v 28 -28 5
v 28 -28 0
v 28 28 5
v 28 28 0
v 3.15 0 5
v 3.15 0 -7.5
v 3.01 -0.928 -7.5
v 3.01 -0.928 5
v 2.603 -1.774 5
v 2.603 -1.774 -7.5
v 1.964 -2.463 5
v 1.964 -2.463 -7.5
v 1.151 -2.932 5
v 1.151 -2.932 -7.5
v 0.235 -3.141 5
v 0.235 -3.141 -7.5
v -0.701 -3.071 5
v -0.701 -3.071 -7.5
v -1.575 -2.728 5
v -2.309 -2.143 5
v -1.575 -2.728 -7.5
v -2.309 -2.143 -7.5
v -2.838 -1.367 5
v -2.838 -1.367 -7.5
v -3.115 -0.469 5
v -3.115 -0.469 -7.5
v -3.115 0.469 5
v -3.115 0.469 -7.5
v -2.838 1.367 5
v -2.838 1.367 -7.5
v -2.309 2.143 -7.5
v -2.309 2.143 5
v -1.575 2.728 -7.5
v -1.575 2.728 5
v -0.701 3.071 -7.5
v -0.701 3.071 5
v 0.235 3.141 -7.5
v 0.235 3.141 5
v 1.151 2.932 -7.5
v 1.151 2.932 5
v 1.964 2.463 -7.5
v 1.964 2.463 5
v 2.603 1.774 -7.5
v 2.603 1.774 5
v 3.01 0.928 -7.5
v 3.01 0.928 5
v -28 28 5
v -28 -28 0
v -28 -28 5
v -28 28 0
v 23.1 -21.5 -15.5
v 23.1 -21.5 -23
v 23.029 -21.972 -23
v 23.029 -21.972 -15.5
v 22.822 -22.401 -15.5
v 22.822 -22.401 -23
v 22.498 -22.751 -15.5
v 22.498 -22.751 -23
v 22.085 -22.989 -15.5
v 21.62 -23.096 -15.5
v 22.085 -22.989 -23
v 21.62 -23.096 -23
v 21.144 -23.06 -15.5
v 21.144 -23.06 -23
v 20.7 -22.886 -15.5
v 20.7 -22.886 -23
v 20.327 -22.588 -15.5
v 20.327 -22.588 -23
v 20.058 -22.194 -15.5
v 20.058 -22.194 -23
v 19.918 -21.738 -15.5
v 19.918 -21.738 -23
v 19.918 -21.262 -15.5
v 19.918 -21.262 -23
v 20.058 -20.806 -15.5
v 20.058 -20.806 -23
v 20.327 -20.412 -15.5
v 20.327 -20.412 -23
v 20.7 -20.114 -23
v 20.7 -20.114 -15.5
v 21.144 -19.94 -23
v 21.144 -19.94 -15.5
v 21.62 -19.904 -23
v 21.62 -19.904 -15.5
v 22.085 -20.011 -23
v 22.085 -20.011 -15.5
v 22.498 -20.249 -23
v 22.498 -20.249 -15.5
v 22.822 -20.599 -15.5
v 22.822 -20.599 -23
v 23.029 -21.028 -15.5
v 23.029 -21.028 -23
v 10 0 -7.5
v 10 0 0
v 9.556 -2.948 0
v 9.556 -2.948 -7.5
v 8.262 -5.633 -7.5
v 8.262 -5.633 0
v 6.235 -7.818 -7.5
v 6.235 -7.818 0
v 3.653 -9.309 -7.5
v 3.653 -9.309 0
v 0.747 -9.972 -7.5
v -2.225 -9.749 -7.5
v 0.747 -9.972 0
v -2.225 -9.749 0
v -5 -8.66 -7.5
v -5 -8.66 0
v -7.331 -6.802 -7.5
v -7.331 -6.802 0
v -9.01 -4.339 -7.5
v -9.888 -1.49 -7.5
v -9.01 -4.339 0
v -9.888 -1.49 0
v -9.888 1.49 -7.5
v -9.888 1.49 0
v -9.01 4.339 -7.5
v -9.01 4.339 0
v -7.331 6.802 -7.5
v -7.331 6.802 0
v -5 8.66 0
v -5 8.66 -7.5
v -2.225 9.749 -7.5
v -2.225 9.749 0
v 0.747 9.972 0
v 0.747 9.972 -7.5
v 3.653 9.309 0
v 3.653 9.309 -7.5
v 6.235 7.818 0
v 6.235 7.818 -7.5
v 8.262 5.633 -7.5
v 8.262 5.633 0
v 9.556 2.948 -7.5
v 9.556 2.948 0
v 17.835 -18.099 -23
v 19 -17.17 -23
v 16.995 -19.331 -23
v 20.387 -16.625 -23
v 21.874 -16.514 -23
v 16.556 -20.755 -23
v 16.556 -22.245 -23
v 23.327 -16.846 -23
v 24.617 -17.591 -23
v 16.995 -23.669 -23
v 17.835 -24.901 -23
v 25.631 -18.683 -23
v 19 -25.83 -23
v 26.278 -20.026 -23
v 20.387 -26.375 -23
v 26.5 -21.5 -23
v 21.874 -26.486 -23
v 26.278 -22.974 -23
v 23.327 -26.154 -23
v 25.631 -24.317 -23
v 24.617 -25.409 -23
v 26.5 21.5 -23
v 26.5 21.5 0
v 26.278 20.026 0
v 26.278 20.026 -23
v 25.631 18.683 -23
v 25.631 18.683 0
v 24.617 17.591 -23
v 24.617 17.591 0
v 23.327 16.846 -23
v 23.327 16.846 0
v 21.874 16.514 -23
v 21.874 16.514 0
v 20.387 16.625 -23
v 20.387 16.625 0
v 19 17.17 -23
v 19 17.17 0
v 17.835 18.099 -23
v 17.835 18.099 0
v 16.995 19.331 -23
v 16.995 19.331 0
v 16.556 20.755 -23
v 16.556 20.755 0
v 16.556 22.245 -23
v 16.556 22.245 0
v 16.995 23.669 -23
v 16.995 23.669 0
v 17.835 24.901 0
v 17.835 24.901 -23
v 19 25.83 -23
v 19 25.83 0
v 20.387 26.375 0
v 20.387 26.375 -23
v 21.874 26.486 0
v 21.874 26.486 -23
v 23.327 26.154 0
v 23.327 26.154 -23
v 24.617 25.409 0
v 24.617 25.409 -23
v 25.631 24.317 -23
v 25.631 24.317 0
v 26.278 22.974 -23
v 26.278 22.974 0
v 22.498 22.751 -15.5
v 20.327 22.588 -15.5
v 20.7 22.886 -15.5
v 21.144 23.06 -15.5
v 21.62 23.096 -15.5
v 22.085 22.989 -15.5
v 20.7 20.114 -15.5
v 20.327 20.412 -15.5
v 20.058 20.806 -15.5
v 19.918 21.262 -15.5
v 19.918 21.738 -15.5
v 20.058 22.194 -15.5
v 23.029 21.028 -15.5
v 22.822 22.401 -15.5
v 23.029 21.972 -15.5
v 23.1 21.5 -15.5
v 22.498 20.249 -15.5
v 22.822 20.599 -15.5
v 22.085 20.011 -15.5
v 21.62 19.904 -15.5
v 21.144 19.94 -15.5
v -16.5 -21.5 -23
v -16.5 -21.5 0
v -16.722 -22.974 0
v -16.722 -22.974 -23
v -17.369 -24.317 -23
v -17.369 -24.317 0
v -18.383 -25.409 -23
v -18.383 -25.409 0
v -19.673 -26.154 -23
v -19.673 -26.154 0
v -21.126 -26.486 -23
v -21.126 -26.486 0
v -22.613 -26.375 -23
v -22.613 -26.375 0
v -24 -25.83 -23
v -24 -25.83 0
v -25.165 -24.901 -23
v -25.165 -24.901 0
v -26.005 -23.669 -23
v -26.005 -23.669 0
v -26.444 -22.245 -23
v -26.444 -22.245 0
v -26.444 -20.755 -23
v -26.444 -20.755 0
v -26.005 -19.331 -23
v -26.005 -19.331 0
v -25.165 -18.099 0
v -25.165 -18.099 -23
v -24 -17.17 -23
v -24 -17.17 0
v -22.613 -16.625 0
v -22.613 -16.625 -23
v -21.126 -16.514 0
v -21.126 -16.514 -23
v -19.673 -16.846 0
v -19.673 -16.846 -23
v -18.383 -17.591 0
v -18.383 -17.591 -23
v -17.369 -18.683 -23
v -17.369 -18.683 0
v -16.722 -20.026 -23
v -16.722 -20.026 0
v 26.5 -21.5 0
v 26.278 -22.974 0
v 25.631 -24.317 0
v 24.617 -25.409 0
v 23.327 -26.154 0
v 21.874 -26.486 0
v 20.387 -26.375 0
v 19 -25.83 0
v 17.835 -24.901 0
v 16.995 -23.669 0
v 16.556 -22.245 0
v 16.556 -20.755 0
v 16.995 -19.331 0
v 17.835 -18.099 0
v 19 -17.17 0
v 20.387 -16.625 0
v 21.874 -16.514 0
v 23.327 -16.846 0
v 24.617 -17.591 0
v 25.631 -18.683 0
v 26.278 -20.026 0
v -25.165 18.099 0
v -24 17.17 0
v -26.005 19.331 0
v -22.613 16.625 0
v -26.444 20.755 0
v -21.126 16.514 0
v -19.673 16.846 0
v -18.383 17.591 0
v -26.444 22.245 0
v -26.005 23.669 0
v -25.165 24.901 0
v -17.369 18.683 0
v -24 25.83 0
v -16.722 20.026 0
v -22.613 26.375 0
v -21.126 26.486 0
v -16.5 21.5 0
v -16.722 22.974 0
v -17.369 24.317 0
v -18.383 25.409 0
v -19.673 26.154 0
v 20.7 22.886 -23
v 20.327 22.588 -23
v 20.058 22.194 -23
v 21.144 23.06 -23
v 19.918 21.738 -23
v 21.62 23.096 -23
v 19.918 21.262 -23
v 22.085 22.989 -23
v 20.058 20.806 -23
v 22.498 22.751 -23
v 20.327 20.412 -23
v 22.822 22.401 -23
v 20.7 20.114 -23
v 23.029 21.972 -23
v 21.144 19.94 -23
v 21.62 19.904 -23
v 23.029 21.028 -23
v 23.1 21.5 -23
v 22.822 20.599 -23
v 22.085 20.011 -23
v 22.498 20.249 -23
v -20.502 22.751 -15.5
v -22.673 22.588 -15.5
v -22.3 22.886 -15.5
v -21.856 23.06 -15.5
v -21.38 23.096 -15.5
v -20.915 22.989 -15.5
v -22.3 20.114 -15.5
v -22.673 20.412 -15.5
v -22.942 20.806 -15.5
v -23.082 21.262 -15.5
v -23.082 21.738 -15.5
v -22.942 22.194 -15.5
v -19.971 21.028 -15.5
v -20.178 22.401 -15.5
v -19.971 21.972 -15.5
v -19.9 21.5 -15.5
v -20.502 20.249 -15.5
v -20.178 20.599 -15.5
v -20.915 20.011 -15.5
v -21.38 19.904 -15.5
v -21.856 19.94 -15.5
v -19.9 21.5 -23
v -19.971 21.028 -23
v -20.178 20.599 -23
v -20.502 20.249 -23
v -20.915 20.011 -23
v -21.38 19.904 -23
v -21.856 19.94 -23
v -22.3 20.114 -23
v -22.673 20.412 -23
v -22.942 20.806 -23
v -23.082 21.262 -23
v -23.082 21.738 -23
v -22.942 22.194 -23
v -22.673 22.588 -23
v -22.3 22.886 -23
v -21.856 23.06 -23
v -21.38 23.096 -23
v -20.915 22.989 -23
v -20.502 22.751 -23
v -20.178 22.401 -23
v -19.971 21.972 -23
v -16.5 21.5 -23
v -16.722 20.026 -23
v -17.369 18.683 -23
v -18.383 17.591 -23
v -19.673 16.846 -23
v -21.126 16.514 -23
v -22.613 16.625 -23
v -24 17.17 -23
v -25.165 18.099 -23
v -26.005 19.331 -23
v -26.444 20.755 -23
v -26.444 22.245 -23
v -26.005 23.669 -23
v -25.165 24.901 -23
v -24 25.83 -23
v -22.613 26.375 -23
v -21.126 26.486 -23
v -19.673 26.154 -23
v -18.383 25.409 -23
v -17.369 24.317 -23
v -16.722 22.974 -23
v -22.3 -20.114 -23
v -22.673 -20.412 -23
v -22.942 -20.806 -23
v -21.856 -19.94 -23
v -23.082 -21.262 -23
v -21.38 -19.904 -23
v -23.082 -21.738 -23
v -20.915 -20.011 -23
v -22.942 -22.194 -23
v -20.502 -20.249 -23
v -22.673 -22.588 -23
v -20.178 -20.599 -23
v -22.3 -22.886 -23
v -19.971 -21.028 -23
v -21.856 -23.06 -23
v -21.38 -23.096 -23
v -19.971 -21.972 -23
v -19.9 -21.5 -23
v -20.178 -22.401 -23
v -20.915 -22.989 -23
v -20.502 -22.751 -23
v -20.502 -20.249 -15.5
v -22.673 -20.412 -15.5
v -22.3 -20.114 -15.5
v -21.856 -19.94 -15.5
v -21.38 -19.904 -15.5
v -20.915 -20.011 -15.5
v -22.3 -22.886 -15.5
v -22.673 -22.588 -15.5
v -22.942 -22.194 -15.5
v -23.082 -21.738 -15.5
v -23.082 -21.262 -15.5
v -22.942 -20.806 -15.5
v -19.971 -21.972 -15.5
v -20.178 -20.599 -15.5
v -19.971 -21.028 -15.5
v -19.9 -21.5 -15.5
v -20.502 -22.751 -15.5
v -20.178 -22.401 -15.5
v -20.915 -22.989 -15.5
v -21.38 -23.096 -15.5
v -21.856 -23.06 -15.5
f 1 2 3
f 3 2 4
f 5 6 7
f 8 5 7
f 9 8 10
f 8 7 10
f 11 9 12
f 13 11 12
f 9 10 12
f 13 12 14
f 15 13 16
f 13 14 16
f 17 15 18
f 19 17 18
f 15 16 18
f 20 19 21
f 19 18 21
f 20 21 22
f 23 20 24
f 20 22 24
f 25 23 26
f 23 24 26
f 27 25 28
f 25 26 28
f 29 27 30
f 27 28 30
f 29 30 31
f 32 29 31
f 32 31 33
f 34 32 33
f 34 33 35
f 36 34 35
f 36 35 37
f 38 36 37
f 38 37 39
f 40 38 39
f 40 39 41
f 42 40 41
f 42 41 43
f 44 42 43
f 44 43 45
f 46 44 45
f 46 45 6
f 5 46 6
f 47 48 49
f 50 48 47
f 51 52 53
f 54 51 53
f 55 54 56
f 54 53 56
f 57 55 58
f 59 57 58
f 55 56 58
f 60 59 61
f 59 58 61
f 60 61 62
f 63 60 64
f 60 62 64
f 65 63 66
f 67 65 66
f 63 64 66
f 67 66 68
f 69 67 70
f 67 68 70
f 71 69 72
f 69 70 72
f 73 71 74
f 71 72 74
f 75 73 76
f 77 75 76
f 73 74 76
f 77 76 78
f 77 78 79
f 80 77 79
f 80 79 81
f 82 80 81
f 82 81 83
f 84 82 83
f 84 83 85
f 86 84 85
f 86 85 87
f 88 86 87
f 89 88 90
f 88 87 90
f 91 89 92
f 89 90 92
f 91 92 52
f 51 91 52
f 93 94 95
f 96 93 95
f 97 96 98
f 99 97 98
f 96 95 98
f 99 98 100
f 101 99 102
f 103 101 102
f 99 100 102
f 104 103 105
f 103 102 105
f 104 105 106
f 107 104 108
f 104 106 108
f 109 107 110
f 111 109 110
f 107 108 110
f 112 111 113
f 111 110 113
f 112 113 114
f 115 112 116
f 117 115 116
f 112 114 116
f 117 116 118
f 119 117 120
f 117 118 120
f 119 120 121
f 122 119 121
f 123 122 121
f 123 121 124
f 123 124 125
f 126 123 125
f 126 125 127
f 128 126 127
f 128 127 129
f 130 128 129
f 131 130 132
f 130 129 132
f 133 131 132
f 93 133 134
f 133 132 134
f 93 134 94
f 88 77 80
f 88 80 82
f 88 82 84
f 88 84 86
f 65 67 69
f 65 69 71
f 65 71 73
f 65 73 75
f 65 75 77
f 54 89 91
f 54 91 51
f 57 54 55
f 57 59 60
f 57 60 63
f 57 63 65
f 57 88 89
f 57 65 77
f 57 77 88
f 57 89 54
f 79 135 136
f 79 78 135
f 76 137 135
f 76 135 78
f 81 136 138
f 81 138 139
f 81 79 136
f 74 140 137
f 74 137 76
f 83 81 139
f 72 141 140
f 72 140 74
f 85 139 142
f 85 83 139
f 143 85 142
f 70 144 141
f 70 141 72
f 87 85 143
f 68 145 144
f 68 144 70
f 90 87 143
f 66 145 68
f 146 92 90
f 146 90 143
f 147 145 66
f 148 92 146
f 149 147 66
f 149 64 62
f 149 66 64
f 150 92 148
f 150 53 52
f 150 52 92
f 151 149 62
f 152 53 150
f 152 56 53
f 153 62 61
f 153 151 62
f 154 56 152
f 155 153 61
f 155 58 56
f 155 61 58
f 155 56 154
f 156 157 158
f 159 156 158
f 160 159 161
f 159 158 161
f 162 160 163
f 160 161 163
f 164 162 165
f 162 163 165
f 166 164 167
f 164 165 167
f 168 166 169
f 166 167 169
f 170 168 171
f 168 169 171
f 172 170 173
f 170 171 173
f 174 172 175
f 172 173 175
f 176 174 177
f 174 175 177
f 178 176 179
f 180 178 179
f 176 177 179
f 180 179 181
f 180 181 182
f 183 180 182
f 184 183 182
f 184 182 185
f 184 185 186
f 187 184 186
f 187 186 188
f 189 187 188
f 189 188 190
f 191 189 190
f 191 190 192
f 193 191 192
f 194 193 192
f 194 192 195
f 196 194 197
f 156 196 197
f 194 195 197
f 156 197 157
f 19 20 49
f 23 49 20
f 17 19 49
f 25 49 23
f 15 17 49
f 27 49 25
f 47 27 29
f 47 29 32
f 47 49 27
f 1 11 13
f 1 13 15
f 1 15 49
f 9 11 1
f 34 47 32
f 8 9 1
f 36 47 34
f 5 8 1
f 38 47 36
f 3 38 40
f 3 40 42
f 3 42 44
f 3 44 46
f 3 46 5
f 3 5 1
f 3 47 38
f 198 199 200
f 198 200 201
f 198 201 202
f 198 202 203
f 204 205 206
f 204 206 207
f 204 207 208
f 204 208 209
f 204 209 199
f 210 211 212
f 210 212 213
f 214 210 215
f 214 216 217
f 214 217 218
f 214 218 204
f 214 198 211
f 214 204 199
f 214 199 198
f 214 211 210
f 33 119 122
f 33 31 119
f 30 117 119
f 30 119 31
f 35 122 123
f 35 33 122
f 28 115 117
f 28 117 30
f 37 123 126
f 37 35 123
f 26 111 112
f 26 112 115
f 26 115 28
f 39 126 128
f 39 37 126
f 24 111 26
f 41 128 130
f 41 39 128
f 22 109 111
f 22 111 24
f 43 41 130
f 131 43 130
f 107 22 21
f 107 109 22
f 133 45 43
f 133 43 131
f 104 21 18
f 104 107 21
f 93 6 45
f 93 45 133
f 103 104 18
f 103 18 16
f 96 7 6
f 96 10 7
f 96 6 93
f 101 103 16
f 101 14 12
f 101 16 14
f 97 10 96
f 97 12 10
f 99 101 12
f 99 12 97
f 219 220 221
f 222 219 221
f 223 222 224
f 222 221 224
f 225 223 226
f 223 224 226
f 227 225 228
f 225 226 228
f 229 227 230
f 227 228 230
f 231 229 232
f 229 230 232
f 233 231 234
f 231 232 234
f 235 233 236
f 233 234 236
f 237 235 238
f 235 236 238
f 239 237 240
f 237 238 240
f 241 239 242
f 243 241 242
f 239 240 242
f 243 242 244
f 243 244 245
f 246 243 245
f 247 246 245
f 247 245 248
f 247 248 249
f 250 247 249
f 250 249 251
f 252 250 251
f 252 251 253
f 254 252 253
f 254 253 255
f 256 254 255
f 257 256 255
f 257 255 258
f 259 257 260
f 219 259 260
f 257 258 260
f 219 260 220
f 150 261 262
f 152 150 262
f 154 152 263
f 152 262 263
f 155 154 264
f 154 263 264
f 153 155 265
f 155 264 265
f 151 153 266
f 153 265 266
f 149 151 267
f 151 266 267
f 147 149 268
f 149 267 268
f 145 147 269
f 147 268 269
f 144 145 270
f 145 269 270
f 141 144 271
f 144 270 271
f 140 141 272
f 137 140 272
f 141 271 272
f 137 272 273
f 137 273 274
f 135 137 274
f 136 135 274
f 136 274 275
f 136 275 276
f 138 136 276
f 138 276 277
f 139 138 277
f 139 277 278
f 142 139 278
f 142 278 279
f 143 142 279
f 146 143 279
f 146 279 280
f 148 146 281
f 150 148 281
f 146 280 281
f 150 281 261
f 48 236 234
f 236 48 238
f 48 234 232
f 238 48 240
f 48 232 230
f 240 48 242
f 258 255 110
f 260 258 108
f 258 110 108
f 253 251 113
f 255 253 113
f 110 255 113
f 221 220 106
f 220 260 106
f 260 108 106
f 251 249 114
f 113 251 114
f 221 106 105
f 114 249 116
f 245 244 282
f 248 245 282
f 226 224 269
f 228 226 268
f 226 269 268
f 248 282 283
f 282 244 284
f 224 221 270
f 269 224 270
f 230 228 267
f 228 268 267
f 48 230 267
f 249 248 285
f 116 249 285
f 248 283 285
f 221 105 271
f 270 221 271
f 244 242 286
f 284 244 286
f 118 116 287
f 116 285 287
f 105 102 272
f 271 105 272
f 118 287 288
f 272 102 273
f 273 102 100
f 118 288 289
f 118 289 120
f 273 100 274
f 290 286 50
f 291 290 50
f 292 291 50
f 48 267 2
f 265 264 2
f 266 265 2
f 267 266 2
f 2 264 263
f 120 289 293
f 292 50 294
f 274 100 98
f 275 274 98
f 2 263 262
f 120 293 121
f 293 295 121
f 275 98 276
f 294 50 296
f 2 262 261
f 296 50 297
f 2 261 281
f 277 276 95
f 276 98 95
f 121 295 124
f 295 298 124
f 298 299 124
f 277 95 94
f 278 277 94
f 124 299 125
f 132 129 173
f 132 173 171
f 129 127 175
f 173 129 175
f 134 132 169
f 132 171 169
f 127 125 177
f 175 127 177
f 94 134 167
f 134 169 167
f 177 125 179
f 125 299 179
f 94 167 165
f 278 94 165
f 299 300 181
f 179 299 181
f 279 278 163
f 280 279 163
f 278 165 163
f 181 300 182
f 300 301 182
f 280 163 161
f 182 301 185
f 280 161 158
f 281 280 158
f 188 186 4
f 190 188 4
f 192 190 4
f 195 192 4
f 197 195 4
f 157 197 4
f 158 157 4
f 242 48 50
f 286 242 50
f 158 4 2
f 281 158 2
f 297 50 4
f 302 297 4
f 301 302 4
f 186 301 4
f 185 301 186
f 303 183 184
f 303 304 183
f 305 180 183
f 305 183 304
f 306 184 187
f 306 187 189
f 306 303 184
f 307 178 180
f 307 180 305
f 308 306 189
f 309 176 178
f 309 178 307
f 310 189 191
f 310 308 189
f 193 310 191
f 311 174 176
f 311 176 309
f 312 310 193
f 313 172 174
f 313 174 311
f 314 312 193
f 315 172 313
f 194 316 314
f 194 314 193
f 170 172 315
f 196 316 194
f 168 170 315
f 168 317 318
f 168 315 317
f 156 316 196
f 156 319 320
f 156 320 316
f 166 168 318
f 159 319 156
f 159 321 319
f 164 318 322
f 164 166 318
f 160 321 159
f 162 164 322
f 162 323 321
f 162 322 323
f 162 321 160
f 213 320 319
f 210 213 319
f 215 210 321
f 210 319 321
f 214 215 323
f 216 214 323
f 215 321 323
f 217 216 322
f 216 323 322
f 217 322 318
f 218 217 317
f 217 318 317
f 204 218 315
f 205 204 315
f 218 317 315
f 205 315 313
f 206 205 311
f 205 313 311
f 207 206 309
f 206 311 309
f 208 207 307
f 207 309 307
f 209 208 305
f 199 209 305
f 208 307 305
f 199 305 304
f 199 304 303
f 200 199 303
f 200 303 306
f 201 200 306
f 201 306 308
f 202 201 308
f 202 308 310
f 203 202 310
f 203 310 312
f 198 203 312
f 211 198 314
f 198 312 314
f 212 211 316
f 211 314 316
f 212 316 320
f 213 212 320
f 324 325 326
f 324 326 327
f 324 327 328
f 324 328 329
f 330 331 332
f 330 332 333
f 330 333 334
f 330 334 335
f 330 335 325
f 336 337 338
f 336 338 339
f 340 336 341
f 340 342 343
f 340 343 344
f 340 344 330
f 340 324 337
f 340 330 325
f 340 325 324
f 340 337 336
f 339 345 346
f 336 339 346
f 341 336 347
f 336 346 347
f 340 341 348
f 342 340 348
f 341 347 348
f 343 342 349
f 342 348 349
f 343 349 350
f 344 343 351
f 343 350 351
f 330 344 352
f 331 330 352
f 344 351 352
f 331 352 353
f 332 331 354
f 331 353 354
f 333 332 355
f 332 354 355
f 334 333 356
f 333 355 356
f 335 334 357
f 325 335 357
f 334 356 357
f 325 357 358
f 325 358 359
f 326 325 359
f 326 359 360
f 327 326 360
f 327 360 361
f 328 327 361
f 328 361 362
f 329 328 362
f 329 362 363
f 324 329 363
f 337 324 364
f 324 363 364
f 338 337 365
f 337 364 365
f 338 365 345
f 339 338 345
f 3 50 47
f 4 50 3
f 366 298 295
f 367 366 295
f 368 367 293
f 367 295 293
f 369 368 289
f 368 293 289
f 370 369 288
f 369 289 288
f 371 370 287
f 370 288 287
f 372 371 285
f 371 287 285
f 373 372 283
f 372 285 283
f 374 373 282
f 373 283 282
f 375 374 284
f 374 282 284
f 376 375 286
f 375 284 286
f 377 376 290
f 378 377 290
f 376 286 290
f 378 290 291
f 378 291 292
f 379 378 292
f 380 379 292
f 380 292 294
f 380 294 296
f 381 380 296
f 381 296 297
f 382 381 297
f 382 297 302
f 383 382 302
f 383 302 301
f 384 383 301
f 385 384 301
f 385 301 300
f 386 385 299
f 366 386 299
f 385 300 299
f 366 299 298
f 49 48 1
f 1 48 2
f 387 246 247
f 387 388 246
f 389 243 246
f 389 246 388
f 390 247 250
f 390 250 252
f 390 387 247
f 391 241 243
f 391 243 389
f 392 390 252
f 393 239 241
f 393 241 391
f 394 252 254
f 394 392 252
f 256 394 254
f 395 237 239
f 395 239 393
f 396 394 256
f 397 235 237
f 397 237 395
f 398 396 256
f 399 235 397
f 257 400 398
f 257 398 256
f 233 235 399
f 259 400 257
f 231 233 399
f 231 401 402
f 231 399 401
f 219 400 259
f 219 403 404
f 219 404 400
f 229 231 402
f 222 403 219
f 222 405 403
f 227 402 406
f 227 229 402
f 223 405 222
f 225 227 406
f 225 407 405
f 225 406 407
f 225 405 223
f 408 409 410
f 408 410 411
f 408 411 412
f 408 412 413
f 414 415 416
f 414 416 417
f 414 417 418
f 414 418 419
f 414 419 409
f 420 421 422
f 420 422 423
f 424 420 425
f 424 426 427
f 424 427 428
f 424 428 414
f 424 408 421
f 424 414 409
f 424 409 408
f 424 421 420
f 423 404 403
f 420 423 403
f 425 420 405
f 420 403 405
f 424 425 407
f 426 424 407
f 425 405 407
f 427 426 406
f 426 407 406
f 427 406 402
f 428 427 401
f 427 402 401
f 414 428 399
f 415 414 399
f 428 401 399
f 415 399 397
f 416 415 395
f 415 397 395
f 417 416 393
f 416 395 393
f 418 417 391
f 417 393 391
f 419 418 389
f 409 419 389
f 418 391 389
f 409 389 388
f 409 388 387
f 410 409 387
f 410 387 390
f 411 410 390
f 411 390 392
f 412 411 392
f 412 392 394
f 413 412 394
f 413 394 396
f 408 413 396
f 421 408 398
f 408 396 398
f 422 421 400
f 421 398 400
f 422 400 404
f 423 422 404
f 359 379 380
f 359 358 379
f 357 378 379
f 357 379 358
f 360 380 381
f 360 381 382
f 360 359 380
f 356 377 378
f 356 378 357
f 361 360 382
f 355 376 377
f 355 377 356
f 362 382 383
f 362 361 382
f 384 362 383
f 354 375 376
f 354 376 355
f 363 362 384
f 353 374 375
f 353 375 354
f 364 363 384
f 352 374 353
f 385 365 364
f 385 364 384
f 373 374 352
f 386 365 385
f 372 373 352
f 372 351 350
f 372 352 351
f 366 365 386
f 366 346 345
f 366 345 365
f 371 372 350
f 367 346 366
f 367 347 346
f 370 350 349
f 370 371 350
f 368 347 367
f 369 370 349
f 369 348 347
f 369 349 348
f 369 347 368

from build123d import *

# Parameters (mm, degrees)
SKETCH_W        = 56
SKETCH_H        = 56
PAD_DEPTH       = 5
SKETCH001_R     = 10
PAD001_DEPTH    = 7.5
SKETCH002_R     = 3.15
POCKET_DEPTH    = 12.501
SKETCH003_R     = 5
PAD002_DEPTH    = 23
SKETCH004_R     = 1.6
POCKET001_DEPTH = 7.5
SKETCH006_R     = 1.6
POCKET002_DEPTH = 7.5
SKETCH007_R     = 1.6
POCKET003_DEPTH = 7.5
SKETCH008_R     = 1.6
POCKET004_DEPTH = 7.5


with BuildPart() as part:
    # Sketch → Pad (new body)
    with BuildSketch(Plane.XY):
        Rectangle(SKETCH_W, SKETCH_H)
    extrude(amount=PAD_DEPTH)

    # Sketch001 (on Face5 of Pad) → Pad001 (join)
    with BuildSketch(Plane(origin=(0, 0, 0), x_dir=(1, 0, 0), z_dir=(0, 0, -1))):
        Circle(SKETCH001_R)
    extrude(amount=PAD001_DEPTH)

    # Sketch002 (on Face8 of Pad001) → Pocket (cut, through all)
    with BuildSketch(Plane(origin=(0, 0, -7.5), x_dir=(1, 0, 0), z_dir=(0, 0, -1))):
        Circle(SKETCH002_R)
    extrude(amount=-POCKET_DEPTH, mode=Mode.SUBTRACT)

    # Sketch003 (on Face4 of Pocket) → Pad002 (join)
    with BuildSketch(Plane(origin=(0, 0, 0), x_dir=(1, 0, 0), z_dir=(0, 0, -1))):
        with Locations((-21.5, 21.5)):
            Circle(SKETCH003_R)
        with Locations((21.5, 21.5)):
            Circle(SKETCH003_R)
        with Locations((-21.5, -21.5)):
            Circle(SKETCH003_R)
        with Locations((21.5, -21.5)):
            Circle(SKETCH003_R)
    extrude(amount=PAD002_DEPTH)

    # Sketch004 (on Face15 of Pad002) → Pocket001 (cut)
    with BuildSketch(Plane(origin=(0, 0, -23), x_dir=(1, 0, 0), z_dir=(0, 0, -1))):
        with Locations((-21.5, 21.5)):
            Circle(SKETCH004_R)
    extrude(amount=-POCKET001_DEPTH, mode=Mode.SUBTRACT)

    # Sketch006 (on Face14 of Pocket001) → Pocket002 (cut)
    with BuildSketch(Plane(origin=(0, 0, -23), x_dir=(1, 0, 0), z_dir=(0, 0, -1))):
        with Locations((21.5, 21.5)):
            Circle(SKETCH006_R)
    extrude(amount=-POCKET002_DEPTH, mode=Mode.SUBTRACT)

    # Sketch007 (on Face15 of Pocket002) → Pocket003 (cut)
    with BuildSketch(Plane(origin=(0, 0, -23), x_dir=(1, 0, 0), z_dir=(0, 0, -1))):
        with Locations((-21.5, -21.5)):
            Circle(SKETCH007_R)
    extrude(amount=-POCKET003_DEPTH, mode=Mode.SUBTRACT)

    # Sketch008 (on Face17 of Pocket003) → Pocket004 (cut)
    with BuildSketch(Plane(origin=(0, 0, -23), x_dir=(1, 0, 0), z_dir=(0, 0, -1))):
        with Locations((21.5, -21.5)):
            Circle(SKETCH008_R)
    extrude(amount=-POCKET004_DEPTH, mode=Mode.SUBTRACT)


solid = part.part
